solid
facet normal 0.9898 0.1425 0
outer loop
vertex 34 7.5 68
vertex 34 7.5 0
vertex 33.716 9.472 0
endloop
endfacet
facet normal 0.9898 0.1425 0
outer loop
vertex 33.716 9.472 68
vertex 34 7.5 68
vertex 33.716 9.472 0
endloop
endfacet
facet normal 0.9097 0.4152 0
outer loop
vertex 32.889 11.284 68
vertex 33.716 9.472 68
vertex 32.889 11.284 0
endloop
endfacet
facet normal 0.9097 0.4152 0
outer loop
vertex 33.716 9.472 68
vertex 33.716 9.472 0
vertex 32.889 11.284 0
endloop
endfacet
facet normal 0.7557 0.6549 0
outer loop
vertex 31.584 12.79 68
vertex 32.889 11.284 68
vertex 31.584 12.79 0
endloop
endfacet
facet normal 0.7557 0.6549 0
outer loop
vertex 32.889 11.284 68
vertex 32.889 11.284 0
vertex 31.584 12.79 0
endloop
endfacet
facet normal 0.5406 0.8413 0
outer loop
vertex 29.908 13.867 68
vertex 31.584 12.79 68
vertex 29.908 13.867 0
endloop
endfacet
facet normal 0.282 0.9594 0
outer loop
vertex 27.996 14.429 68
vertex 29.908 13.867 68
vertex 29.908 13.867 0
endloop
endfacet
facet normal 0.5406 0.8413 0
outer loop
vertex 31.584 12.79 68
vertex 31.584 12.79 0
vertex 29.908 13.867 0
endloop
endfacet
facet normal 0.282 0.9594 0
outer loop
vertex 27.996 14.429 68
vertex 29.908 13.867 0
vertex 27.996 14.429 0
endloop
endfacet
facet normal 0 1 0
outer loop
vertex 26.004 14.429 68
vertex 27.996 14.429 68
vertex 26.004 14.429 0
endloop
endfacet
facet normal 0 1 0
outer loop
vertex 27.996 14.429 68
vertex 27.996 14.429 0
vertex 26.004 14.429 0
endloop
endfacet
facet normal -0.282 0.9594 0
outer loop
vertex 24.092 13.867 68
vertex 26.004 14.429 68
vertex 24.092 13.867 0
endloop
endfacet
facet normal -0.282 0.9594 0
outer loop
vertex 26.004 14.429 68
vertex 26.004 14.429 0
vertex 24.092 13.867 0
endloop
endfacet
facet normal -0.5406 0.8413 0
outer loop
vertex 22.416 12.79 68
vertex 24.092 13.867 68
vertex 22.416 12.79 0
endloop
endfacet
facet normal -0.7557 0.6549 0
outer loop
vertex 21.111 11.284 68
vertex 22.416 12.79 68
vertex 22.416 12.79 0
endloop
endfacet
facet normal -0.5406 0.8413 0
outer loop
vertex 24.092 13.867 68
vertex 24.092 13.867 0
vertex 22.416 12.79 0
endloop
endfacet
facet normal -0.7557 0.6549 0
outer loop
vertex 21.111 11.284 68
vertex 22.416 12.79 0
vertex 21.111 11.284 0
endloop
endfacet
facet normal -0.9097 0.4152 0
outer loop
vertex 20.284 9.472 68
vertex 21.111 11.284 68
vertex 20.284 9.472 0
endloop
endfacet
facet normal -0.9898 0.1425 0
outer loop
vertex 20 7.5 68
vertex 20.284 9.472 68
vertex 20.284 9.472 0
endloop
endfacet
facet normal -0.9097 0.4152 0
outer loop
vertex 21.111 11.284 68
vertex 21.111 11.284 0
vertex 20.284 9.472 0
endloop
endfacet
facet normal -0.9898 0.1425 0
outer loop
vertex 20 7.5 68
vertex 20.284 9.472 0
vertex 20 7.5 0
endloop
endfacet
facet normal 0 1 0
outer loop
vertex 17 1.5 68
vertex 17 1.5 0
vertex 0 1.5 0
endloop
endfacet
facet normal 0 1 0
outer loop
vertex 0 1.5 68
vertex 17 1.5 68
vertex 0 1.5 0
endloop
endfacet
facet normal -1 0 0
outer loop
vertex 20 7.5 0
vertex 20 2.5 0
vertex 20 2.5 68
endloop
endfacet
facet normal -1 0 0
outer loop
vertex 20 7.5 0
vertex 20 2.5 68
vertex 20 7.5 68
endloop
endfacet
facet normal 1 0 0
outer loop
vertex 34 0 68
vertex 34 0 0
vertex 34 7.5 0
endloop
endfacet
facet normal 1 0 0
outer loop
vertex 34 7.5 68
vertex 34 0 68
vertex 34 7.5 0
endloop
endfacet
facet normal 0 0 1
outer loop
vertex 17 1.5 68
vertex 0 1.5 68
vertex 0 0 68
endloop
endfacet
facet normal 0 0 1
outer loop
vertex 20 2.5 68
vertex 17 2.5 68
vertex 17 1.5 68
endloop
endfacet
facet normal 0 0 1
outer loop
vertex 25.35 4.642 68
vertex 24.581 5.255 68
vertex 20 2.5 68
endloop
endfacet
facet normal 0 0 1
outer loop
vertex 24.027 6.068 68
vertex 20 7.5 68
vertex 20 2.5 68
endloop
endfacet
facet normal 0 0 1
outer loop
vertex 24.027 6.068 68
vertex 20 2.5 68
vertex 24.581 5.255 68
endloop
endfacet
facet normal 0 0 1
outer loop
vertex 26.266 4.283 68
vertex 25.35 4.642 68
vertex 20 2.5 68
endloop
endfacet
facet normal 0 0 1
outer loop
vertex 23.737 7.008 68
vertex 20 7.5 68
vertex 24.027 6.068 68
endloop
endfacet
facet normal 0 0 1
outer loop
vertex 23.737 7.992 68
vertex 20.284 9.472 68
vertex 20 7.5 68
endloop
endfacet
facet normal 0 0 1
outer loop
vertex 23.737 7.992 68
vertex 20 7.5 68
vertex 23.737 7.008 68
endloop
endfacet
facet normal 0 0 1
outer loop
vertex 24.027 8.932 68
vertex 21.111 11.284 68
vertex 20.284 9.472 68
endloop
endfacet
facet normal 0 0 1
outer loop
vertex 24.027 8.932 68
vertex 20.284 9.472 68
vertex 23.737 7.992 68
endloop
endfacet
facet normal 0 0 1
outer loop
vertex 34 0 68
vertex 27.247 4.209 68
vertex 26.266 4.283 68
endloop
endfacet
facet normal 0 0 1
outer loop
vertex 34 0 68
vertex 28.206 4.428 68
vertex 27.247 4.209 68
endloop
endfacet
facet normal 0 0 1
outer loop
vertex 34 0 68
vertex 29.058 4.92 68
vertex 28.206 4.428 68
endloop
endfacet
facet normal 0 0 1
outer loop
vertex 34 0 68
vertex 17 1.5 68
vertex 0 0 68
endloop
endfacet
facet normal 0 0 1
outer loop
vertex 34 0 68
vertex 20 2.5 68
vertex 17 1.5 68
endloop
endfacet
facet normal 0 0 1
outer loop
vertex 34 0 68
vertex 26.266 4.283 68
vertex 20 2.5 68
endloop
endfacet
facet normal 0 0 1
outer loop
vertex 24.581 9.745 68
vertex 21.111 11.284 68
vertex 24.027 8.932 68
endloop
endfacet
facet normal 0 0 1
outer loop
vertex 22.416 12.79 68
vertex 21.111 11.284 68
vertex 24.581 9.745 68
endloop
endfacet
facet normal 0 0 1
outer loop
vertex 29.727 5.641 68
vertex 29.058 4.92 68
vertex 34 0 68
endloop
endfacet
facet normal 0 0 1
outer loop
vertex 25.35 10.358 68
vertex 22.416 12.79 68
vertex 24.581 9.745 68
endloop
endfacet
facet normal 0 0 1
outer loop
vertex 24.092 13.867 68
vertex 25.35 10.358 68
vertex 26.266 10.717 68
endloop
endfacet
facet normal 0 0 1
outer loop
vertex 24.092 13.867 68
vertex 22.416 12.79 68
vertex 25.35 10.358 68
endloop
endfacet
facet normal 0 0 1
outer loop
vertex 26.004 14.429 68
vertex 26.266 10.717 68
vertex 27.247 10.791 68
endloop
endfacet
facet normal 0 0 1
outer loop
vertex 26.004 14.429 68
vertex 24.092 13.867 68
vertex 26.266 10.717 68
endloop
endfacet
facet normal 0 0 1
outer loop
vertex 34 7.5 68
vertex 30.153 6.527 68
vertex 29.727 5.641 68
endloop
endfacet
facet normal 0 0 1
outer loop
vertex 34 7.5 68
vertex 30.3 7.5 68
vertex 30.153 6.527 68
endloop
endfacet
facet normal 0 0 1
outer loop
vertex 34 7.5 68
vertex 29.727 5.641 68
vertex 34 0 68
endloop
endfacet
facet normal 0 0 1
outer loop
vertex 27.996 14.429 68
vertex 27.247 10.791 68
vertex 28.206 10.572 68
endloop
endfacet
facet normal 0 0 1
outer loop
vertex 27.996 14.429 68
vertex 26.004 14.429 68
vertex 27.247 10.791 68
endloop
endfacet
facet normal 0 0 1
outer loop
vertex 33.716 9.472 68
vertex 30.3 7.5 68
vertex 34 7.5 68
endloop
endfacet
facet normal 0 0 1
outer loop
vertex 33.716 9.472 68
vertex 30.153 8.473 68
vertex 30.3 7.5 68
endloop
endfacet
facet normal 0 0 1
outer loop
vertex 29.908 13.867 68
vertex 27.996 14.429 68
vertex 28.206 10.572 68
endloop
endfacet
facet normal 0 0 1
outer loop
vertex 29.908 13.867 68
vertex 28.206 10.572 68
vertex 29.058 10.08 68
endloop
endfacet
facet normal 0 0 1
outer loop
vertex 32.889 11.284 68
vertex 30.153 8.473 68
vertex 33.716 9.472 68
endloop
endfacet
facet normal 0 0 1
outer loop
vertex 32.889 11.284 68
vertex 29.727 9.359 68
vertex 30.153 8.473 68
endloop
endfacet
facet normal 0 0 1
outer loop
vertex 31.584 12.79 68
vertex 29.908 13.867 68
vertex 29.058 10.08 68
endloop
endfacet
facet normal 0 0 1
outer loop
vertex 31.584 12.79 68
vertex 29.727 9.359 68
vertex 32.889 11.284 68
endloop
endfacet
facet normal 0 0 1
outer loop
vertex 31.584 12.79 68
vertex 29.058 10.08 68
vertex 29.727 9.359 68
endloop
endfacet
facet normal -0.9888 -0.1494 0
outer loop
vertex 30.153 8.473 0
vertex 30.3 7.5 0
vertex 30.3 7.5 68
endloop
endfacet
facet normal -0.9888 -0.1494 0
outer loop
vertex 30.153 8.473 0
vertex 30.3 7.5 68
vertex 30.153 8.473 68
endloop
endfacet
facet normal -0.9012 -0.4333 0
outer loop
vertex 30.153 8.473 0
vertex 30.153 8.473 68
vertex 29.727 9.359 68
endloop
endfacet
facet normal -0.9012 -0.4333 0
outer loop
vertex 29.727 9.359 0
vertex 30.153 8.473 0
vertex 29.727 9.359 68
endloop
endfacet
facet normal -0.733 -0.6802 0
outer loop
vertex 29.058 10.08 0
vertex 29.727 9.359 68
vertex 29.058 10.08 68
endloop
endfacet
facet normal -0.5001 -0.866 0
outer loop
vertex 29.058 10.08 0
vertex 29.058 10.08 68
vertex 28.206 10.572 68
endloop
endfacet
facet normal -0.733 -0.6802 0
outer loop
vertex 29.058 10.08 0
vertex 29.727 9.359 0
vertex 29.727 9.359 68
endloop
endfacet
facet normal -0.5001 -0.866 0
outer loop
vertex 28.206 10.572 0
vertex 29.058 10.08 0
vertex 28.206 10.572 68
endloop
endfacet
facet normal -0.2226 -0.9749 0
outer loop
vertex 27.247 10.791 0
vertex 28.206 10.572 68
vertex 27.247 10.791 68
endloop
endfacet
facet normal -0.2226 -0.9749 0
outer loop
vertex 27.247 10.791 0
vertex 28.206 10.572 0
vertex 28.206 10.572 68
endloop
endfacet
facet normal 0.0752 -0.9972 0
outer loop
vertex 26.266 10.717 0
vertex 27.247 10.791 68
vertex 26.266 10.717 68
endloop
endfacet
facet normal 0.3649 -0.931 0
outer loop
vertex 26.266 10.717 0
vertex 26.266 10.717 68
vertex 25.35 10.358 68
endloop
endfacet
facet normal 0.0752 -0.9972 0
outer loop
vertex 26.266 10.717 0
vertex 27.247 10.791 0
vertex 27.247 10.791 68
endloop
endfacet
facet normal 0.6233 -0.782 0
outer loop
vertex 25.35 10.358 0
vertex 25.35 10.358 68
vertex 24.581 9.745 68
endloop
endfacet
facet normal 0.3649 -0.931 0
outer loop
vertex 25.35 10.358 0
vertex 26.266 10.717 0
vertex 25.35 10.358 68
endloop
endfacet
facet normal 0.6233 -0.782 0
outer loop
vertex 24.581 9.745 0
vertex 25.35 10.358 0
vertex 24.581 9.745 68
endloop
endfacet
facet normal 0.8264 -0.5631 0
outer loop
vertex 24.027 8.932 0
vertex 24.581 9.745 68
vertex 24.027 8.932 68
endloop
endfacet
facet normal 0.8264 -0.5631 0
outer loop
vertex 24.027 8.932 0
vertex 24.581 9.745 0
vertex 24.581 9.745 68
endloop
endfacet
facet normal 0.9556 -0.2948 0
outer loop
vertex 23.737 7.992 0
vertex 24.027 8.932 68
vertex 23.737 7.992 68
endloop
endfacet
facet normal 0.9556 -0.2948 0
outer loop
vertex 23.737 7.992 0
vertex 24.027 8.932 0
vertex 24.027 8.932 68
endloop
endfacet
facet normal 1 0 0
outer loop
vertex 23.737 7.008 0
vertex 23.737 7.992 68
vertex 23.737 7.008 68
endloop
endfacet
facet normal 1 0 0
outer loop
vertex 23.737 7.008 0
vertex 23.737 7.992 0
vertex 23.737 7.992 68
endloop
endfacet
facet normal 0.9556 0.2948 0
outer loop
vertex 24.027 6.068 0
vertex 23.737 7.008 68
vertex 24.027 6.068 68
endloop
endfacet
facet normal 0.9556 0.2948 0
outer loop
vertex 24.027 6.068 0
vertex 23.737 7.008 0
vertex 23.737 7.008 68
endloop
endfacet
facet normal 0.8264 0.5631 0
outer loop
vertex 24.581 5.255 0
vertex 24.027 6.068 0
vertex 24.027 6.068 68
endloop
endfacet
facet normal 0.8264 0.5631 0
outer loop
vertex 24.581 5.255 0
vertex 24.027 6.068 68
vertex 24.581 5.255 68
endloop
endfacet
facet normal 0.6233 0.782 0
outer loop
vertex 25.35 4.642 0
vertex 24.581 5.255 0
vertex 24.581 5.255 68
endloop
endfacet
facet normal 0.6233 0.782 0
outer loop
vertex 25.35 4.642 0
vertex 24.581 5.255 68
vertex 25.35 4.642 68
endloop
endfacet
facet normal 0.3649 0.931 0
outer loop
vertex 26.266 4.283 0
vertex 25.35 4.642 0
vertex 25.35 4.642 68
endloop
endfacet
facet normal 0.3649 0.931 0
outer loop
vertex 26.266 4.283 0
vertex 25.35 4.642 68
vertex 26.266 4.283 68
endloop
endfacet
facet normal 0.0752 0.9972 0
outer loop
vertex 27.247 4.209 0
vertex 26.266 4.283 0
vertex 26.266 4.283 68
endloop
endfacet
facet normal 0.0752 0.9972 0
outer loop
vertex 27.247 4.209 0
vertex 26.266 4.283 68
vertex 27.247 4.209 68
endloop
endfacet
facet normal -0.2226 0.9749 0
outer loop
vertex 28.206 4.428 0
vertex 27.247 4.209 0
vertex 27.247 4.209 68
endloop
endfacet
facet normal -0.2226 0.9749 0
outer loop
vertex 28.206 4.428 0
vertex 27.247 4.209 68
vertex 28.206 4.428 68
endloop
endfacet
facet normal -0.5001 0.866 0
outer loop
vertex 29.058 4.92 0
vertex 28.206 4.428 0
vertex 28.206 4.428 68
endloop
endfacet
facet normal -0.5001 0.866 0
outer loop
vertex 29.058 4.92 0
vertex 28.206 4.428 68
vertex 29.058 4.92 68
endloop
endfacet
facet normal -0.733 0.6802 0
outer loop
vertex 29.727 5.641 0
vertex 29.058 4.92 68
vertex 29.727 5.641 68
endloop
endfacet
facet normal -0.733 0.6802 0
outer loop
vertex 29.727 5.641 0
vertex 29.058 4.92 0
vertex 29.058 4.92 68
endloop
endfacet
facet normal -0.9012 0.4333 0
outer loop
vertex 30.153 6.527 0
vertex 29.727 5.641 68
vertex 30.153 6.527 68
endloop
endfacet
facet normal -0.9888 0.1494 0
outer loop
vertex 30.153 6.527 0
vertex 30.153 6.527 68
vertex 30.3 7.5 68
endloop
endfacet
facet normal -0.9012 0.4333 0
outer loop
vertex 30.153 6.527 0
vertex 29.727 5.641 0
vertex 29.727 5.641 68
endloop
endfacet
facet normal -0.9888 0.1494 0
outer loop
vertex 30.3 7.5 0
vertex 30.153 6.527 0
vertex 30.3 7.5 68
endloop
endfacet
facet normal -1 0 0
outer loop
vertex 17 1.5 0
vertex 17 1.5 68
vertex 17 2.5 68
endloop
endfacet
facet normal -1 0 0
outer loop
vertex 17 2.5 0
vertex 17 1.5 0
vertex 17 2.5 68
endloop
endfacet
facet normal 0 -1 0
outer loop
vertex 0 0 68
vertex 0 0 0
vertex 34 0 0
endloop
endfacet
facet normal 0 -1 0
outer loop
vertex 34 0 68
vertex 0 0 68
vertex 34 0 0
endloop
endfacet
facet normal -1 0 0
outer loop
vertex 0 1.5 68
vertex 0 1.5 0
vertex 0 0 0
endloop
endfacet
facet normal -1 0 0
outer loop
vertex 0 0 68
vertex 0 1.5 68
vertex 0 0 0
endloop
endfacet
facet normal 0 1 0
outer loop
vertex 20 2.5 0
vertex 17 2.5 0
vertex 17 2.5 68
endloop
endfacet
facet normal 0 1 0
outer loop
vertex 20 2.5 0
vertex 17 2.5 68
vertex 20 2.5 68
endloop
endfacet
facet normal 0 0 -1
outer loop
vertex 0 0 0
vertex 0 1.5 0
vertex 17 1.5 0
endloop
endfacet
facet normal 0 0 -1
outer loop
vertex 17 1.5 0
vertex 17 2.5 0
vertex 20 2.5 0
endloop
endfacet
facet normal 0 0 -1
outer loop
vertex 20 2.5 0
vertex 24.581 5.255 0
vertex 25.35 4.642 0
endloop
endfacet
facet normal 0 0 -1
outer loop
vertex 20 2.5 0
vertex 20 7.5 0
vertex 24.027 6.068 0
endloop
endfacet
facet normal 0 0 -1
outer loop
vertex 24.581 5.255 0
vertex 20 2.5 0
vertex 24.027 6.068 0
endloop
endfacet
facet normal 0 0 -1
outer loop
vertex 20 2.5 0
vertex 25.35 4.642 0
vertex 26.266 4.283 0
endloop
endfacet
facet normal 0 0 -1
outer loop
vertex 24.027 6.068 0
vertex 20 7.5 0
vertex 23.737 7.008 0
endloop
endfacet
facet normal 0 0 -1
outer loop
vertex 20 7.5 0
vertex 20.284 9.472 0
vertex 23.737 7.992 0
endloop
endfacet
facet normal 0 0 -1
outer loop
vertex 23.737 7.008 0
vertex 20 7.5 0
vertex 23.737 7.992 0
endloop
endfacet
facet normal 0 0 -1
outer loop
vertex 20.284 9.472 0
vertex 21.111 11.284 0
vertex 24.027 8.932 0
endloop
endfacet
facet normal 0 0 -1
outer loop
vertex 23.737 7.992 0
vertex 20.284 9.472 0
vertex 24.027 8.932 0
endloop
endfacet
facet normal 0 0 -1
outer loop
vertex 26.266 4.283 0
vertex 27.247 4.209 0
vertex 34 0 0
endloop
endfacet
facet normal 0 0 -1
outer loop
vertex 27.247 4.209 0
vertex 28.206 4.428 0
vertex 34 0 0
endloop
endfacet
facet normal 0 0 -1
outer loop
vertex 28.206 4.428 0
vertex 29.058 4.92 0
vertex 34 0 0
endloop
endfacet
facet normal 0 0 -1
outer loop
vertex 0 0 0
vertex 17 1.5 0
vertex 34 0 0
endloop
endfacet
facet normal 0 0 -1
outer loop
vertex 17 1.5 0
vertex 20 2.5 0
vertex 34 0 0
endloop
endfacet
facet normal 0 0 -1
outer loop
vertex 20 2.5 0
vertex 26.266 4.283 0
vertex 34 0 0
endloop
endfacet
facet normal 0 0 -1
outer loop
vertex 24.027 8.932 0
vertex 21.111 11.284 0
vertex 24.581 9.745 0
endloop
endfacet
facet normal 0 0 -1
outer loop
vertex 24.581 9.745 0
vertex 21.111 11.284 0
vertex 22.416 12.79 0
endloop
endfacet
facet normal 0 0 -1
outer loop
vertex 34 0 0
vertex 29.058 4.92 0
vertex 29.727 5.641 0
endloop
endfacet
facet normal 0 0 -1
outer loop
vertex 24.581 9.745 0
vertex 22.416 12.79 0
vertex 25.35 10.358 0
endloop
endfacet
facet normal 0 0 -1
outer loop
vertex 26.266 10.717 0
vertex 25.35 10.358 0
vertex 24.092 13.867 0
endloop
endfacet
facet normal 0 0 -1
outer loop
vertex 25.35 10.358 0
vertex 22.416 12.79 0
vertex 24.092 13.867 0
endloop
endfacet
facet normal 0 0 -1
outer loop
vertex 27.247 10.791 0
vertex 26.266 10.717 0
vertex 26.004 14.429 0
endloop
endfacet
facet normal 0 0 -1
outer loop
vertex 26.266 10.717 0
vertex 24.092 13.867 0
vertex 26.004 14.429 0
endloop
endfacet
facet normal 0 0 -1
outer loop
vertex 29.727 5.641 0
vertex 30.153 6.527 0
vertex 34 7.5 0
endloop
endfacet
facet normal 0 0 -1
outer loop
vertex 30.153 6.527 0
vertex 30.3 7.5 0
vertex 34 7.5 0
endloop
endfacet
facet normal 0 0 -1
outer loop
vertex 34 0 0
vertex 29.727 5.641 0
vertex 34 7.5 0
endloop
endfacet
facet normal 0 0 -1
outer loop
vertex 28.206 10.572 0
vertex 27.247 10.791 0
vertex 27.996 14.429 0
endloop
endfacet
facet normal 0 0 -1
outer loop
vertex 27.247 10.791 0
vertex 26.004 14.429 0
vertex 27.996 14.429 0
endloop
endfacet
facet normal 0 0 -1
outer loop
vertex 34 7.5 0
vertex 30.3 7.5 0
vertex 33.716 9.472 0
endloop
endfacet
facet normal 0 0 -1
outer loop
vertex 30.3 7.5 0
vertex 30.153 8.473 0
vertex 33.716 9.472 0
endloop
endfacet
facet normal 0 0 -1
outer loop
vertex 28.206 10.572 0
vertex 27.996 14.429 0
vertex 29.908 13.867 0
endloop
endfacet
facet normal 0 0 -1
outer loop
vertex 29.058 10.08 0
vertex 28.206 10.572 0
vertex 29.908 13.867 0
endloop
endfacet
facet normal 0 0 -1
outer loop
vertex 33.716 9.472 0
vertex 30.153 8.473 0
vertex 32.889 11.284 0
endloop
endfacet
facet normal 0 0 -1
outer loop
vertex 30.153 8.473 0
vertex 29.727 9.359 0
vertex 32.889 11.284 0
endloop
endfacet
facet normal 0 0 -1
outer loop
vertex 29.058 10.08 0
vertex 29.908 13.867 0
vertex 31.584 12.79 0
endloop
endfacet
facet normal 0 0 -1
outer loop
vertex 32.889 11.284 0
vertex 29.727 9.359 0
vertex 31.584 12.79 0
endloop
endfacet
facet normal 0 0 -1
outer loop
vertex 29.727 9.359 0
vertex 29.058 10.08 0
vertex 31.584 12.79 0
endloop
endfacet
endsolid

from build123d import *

# Parameters (mm, degrees)
SKETCH_R  = 3.3
PAD_DEPTH = 68


with BuildPart() as part:
    # Sketch → Pad (new body)
    with BuildSketch(Plane.XY):
        with BuildLine():
            Line((17, 1.5), (0, 1.5))
            Line((0, 1.5), (0, 0))
            Line((0, 0), (34, 0))
            Line((34, 0), (34, 7.499986))
            ThreePointArc((34, 7.499986), (27.000014, 14.5), (20, 7.500014))
            Line((20, 2.5), (20, 7.500014))
            Line((17, 2.5), (20, 2.5))
            Line((17, 1.5), (17, 2.5))
        make_face()
        with Locations((27, 7.5)):
            Circle(SKETCH_R, mode=Mode.SUBTRACT)
    extrude(amount=PAD_DEPTH)


solid = part.part
